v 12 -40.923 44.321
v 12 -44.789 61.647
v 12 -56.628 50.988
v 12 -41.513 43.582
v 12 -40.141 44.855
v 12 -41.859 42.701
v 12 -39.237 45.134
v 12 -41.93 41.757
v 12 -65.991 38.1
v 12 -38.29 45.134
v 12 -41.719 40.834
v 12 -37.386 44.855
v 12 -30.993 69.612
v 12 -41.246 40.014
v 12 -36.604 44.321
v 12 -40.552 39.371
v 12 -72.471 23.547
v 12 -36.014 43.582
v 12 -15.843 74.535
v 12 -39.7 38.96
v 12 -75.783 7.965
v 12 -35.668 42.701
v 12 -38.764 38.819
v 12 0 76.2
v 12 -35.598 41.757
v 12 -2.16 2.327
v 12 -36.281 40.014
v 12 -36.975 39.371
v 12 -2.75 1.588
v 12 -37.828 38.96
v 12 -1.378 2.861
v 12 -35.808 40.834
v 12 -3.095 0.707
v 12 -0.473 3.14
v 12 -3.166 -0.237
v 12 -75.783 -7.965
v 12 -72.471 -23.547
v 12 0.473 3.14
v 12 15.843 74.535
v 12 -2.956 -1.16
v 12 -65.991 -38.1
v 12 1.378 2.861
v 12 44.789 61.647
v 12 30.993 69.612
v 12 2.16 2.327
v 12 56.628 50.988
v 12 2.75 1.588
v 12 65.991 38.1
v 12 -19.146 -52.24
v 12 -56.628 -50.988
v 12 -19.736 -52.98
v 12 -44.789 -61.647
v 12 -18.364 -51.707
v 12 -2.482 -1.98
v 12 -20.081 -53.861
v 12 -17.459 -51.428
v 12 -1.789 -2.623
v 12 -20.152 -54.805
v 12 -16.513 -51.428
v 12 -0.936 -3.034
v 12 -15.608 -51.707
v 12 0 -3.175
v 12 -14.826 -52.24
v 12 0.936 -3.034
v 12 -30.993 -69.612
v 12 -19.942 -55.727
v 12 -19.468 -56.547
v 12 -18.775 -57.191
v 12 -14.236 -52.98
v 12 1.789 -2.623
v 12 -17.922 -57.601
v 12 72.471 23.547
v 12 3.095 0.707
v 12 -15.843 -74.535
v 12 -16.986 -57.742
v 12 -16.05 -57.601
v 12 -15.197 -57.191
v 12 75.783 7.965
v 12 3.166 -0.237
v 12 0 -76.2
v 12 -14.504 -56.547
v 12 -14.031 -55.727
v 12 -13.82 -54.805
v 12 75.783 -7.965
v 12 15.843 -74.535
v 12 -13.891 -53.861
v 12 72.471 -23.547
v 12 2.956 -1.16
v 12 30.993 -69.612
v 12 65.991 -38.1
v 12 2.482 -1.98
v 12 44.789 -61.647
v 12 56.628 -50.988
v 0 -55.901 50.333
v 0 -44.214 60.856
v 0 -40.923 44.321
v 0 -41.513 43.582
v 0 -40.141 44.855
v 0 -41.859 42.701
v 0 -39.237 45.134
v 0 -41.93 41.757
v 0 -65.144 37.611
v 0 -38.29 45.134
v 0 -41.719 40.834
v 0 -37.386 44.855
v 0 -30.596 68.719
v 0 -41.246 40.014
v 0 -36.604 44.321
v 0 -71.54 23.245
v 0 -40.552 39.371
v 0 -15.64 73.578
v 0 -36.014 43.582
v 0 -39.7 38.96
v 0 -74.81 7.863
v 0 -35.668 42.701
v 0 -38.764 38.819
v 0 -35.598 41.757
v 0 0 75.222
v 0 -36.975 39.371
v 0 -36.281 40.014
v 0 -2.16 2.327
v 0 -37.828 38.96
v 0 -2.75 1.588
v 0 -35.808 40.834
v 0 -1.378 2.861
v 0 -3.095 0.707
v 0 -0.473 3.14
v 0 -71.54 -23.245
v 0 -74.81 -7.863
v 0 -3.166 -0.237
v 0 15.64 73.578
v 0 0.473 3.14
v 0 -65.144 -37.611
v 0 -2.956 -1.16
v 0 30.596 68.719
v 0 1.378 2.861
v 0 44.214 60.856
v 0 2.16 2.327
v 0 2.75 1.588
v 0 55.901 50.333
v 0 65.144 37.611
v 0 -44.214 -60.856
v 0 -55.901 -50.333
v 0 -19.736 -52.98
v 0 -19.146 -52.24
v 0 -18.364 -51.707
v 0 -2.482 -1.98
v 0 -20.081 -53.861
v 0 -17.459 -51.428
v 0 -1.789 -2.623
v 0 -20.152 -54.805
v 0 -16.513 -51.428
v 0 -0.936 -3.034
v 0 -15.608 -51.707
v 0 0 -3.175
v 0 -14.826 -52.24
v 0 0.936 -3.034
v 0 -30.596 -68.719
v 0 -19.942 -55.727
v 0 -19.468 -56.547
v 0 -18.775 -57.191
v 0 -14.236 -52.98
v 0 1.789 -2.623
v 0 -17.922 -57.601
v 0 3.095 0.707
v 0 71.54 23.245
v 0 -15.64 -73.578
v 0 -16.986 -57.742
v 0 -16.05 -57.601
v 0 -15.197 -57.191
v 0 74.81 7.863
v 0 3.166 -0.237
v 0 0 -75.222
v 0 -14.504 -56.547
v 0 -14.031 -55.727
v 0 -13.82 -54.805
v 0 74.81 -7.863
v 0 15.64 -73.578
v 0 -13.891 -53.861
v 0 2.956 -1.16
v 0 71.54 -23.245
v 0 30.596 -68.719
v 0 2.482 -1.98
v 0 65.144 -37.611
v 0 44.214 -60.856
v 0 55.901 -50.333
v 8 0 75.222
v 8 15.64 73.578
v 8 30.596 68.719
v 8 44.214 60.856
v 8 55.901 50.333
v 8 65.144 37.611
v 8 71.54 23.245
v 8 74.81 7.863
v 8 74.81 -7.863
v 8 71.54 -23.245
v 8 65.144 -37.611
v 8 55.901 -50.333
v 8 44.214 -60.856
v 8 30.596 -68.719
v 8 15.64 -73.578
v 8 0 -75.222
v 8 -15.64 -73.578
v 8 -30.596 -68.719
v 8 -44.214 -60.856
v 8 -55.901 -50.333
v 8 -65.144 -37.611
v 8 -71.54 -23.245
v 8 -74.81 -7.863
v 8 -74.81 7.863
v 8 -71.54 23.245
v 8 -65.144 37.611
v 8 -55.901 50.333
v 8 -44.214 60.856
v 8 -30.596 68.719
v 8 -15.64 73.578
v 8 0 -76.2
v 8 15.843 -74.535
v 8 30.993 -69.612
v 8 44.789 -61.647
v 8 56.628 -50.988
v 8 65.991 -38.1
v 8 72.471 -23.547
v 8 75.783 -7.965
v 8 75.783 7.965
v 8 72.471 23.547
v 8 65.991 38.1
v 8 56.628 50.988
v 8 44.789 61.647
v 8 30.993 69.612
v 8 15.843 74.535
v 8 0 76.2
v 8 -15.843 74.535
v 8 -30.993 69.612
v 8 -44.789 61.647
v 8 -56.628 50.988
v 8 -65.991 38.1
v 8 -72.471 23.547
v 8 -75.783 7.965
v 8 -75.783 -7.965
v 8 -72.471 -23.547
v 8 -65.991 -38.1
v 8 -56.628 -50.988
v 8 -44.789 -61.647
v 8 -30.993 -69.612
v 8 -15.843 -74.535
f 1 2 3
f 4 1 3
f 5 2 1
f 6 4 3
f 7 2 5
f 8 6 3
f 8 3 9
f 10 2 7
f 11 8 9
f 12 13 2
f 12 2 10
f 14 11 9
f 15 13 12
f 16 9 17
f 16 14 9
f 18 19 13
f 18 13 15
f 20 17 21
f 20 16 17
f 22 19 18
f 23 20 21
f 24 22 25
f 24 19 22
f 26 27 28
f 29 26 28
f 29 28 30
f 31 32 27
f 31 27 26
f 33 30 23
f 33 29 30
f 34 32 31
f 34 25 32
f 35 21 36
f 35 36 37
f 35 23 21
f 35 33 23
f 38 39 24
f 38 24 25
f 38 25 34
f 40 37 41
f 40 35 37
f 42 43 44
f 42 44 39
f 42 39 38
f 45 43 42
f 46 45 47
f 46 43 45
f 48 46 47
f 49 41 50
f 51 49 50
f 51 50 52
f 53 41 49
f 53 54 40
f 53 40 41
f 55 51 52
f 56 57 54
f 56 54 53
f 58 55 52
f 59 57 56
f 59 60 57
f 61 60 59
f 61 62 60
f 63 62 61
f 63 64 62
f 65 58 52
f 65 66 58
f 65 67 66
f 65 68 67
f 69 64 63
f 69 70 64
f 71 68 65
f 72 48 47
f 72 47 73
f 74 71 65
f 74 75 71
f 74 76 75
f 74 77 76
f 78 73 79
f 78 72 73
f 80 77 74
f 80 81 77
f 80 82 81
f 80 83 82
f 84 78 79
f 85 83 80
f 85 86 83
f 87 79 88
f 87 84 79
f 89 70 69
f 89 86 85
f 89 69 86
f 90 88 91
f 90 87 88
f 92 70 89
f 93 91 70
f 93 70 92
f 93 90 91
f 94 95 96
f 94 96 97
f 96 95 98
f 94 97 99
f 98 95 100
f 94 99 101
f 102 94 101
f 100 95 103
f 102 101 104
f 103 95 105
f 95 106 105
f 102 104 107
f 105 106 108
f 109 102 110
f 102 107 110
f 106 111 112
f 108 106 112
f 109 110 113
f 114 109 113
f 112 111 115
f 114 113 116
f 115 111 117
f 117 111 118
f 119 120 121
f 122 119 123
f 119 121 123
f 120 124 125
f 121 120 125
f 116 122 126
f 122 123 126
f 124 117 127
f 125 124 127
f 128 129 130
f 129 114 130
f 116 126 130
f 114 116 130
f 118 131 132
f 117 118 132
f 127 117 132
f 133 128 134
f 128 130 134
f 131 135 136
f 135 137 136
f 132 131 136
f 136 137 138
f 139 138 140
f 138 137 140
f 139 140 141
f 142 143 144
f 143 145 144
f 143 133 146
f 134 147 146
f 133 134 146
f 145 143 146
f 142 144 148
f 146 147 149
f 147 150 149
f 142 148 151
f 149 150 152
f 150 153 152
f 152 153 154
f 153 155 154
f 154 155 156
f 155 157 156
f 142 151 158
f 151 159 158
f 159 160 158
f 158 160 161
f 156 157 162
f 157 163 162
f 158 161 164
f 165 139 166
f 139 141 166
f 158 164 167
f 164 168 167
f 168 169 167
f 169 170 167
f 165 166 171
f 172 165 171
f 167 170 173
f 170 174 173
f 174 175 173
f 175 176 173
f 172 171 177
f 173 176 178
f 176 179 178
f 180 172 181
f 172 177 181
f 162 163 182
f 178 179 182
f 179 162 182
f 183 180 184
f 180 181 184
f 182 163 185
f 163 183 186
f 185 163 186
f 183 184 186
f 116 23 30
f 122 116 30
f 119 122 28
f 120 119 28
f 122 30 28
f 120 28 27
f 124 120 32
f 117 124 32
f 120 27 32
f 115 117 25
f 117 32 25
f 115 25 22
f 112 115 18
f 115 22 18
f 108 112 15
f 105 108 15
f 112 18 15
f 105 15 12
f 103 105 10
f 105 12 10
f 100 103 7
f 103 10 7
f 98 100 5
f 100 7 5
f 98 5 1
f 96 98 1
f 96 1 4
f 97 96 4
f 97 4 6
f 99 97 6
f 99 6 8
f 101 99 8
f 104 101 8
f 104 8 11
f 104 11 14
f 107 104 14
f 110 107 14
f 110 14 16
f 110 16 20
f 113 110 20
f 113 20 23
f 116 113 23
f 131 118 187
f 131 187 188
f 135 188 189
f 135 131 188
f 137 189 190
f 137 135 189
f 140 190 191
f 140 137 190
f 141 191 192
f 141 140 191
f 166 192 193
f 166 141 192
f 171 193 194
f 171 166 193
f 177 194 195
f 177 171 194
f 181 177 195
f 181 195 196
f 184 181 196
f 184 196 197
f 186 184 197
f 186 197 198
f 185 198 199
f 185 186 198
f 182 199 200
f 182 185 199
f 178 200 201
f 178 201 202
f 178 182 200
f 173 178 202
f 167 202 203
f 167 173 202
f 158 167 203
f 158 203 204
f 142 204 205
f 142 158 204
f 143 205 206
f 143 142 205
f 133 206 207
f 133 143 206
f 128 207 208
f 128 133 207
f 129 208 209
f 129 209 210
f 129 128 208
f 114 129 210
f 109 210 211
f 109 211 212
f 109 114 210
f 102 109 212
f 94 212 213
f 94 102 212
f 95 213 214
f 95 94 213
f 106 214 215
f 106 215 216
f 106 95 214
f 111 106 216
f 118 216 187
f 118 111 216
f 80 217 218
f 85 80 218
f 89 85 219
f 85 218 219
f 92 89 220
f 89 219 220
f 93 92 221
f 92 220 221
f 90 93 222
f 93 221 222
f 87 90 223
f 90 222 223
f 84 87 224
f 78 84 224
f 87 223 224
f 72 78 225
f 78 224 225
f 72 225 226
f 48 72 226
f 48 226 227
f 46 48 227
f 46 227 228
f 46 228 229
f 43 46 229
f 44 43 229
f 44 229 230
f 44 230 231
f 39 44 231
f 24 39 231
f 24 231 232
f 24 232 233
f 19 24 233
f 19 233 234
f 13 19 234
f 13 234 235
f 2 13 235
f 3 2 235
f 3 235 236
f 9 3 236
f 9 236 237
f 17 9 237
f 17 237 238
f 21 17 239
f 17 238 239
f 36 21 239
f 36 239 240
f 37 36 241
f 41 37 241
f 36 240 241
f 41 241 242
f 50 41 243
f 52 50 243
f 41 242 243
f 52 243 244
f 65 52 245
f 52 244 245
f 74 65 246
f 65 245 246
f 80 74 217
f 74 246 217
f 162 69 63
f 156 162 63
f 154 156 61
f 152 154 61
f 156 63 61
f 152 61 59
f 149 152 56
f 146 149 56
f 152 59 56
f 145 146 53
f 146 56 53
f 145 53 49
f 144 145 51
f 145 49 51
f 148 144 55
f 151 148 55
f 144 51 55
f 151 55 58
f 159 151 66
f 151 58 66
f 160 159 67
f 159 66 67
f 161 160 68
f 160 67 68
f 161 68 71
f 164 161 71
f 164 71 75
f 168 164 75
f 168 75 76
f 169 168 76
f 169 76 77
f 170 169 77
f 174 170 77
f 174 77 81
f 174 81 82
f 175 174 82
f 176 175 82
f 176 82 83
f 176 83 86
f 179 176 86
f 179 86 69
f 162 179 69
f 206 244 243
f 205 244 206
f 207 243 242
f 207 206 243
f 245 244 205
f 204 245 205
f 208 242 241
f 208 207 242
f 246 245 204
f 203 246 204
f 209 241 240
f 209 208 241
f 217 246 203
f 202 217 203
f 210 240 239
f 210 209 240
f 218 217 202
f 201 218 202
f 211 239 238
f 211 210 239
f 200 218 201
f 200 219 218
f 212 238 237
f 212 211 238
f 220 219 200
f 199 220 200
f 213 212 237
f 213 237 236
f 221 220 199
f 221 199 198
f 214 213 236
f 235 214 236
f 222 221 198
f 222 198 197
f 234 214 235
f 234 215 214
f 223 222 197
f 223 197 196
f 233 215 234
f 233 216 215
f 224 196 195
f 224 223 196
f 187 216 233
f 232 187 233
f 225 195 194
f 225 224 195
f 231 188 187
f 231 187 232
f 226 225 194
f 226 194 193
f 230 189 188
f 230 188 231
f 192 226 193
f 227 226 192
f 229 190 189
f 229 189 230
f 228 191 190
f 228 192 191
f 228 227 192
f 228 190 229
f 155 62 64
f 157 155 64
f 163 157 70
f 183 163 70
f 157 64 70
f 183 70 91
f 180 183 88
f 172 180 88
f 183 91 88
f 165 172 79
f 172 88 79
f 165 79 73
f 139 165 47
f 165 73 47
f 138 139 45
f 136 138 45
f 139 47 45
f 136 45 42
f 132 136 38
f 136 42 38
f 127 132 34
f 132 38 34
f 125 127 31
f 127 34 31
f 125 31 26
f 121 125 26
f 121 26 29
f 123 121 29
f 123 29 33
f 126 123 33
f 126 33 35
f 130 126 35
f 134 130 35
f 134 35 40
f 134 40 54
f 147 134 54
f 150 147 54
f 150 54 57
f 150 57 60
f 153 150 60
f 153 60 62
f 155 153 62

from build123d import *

# Parameters (mm, degrees)
SKETCH1_R           = 76.2
BOSS_EXTRUDE1_DEPTH = 12
SKETCH2_OUTSIDE_W   = 197.572
SKETCH2_OUTSIDE_H   = 197.572
SKETCH2_OUTSIDE_R   = 75.2221
CUT_EXTRUDE1_DEPTH  = 8
SKETCH3_R           = 3.175
CUT_EXTRUDE2_DEPTH  = 109.429147373
SKETCH5_R           = 3.175
CUT_EXTRUDE3_DEPTH  = 109.429147373
CIRPATTERN1_COUNT   = 3


with BuildPart() as part:
    # Sketch1 → Boss-Extrude1 (new body)
    with BuildSketch(Plane(origin=(0, 0, 0), x_dir=(0, 0, -1), z_dir=(1, 0, 0))):
        Circle(SKETCH1_R)
    extrude(amount=BOSS_EXTRUDE1_DEPTH)

    # Sketch2 outside → Cut-Extrude1 (cut)
    with BuildSketch(Plane.ZY):
        Rectangle(SKETCH2_OUTSIDE_W, SKETCH2_OUTSIDE_H)
        Circle(SKETCH2_OUTSIDE_R, mode=Mode.SUBTRACT)
    extrude(amount=-CUT_EXTRUDE1_DEPTH, mode=Mode.SUBTRACT)

    # Sketch3 → Cut-Extrude2 (cut, through all)
    with BuildSketch(Plane(origin=(12, 0, 0), x_dir=(0, 0, -1), z_dir=(1, 0, 0))):
        Circle(SKETCH3_R)
    extrude(amount=-CUT_EXTRUDE2_DEPTH, mode=Mode.SUBTRACT)

    # Sketch5 → Cut-Extrude3 (cut, through all)
    with BuildSketch(Plane(origin=(12, 0, 0), x_dir=(0, 0, -1), z_dir=(1, 0, 0))):
        with Locations((-41.99401686, -38.763707871)):
            Circle(SKETCH5_R)
    cut_extrude3 = extrude(amount=-CUT_EXTRUDE3_DEPTH, mode=Mode.SUBTRACT)

    # CirPattern1: Cut-Extrude3 ×3 about axis, 1 skipped
    cirpattern1_axis = Axis((12, 0, 0), (1, 0, 0))
    add([cut_extrude3.rotate(cirpattern1_axis, i * 360 / CIRPATTERN1_COUNT) for i in range(1, CIRPATTERN1_COUNT) if i not in (2,)], mode=Mode.SUBTRACT)


solid = part.part
